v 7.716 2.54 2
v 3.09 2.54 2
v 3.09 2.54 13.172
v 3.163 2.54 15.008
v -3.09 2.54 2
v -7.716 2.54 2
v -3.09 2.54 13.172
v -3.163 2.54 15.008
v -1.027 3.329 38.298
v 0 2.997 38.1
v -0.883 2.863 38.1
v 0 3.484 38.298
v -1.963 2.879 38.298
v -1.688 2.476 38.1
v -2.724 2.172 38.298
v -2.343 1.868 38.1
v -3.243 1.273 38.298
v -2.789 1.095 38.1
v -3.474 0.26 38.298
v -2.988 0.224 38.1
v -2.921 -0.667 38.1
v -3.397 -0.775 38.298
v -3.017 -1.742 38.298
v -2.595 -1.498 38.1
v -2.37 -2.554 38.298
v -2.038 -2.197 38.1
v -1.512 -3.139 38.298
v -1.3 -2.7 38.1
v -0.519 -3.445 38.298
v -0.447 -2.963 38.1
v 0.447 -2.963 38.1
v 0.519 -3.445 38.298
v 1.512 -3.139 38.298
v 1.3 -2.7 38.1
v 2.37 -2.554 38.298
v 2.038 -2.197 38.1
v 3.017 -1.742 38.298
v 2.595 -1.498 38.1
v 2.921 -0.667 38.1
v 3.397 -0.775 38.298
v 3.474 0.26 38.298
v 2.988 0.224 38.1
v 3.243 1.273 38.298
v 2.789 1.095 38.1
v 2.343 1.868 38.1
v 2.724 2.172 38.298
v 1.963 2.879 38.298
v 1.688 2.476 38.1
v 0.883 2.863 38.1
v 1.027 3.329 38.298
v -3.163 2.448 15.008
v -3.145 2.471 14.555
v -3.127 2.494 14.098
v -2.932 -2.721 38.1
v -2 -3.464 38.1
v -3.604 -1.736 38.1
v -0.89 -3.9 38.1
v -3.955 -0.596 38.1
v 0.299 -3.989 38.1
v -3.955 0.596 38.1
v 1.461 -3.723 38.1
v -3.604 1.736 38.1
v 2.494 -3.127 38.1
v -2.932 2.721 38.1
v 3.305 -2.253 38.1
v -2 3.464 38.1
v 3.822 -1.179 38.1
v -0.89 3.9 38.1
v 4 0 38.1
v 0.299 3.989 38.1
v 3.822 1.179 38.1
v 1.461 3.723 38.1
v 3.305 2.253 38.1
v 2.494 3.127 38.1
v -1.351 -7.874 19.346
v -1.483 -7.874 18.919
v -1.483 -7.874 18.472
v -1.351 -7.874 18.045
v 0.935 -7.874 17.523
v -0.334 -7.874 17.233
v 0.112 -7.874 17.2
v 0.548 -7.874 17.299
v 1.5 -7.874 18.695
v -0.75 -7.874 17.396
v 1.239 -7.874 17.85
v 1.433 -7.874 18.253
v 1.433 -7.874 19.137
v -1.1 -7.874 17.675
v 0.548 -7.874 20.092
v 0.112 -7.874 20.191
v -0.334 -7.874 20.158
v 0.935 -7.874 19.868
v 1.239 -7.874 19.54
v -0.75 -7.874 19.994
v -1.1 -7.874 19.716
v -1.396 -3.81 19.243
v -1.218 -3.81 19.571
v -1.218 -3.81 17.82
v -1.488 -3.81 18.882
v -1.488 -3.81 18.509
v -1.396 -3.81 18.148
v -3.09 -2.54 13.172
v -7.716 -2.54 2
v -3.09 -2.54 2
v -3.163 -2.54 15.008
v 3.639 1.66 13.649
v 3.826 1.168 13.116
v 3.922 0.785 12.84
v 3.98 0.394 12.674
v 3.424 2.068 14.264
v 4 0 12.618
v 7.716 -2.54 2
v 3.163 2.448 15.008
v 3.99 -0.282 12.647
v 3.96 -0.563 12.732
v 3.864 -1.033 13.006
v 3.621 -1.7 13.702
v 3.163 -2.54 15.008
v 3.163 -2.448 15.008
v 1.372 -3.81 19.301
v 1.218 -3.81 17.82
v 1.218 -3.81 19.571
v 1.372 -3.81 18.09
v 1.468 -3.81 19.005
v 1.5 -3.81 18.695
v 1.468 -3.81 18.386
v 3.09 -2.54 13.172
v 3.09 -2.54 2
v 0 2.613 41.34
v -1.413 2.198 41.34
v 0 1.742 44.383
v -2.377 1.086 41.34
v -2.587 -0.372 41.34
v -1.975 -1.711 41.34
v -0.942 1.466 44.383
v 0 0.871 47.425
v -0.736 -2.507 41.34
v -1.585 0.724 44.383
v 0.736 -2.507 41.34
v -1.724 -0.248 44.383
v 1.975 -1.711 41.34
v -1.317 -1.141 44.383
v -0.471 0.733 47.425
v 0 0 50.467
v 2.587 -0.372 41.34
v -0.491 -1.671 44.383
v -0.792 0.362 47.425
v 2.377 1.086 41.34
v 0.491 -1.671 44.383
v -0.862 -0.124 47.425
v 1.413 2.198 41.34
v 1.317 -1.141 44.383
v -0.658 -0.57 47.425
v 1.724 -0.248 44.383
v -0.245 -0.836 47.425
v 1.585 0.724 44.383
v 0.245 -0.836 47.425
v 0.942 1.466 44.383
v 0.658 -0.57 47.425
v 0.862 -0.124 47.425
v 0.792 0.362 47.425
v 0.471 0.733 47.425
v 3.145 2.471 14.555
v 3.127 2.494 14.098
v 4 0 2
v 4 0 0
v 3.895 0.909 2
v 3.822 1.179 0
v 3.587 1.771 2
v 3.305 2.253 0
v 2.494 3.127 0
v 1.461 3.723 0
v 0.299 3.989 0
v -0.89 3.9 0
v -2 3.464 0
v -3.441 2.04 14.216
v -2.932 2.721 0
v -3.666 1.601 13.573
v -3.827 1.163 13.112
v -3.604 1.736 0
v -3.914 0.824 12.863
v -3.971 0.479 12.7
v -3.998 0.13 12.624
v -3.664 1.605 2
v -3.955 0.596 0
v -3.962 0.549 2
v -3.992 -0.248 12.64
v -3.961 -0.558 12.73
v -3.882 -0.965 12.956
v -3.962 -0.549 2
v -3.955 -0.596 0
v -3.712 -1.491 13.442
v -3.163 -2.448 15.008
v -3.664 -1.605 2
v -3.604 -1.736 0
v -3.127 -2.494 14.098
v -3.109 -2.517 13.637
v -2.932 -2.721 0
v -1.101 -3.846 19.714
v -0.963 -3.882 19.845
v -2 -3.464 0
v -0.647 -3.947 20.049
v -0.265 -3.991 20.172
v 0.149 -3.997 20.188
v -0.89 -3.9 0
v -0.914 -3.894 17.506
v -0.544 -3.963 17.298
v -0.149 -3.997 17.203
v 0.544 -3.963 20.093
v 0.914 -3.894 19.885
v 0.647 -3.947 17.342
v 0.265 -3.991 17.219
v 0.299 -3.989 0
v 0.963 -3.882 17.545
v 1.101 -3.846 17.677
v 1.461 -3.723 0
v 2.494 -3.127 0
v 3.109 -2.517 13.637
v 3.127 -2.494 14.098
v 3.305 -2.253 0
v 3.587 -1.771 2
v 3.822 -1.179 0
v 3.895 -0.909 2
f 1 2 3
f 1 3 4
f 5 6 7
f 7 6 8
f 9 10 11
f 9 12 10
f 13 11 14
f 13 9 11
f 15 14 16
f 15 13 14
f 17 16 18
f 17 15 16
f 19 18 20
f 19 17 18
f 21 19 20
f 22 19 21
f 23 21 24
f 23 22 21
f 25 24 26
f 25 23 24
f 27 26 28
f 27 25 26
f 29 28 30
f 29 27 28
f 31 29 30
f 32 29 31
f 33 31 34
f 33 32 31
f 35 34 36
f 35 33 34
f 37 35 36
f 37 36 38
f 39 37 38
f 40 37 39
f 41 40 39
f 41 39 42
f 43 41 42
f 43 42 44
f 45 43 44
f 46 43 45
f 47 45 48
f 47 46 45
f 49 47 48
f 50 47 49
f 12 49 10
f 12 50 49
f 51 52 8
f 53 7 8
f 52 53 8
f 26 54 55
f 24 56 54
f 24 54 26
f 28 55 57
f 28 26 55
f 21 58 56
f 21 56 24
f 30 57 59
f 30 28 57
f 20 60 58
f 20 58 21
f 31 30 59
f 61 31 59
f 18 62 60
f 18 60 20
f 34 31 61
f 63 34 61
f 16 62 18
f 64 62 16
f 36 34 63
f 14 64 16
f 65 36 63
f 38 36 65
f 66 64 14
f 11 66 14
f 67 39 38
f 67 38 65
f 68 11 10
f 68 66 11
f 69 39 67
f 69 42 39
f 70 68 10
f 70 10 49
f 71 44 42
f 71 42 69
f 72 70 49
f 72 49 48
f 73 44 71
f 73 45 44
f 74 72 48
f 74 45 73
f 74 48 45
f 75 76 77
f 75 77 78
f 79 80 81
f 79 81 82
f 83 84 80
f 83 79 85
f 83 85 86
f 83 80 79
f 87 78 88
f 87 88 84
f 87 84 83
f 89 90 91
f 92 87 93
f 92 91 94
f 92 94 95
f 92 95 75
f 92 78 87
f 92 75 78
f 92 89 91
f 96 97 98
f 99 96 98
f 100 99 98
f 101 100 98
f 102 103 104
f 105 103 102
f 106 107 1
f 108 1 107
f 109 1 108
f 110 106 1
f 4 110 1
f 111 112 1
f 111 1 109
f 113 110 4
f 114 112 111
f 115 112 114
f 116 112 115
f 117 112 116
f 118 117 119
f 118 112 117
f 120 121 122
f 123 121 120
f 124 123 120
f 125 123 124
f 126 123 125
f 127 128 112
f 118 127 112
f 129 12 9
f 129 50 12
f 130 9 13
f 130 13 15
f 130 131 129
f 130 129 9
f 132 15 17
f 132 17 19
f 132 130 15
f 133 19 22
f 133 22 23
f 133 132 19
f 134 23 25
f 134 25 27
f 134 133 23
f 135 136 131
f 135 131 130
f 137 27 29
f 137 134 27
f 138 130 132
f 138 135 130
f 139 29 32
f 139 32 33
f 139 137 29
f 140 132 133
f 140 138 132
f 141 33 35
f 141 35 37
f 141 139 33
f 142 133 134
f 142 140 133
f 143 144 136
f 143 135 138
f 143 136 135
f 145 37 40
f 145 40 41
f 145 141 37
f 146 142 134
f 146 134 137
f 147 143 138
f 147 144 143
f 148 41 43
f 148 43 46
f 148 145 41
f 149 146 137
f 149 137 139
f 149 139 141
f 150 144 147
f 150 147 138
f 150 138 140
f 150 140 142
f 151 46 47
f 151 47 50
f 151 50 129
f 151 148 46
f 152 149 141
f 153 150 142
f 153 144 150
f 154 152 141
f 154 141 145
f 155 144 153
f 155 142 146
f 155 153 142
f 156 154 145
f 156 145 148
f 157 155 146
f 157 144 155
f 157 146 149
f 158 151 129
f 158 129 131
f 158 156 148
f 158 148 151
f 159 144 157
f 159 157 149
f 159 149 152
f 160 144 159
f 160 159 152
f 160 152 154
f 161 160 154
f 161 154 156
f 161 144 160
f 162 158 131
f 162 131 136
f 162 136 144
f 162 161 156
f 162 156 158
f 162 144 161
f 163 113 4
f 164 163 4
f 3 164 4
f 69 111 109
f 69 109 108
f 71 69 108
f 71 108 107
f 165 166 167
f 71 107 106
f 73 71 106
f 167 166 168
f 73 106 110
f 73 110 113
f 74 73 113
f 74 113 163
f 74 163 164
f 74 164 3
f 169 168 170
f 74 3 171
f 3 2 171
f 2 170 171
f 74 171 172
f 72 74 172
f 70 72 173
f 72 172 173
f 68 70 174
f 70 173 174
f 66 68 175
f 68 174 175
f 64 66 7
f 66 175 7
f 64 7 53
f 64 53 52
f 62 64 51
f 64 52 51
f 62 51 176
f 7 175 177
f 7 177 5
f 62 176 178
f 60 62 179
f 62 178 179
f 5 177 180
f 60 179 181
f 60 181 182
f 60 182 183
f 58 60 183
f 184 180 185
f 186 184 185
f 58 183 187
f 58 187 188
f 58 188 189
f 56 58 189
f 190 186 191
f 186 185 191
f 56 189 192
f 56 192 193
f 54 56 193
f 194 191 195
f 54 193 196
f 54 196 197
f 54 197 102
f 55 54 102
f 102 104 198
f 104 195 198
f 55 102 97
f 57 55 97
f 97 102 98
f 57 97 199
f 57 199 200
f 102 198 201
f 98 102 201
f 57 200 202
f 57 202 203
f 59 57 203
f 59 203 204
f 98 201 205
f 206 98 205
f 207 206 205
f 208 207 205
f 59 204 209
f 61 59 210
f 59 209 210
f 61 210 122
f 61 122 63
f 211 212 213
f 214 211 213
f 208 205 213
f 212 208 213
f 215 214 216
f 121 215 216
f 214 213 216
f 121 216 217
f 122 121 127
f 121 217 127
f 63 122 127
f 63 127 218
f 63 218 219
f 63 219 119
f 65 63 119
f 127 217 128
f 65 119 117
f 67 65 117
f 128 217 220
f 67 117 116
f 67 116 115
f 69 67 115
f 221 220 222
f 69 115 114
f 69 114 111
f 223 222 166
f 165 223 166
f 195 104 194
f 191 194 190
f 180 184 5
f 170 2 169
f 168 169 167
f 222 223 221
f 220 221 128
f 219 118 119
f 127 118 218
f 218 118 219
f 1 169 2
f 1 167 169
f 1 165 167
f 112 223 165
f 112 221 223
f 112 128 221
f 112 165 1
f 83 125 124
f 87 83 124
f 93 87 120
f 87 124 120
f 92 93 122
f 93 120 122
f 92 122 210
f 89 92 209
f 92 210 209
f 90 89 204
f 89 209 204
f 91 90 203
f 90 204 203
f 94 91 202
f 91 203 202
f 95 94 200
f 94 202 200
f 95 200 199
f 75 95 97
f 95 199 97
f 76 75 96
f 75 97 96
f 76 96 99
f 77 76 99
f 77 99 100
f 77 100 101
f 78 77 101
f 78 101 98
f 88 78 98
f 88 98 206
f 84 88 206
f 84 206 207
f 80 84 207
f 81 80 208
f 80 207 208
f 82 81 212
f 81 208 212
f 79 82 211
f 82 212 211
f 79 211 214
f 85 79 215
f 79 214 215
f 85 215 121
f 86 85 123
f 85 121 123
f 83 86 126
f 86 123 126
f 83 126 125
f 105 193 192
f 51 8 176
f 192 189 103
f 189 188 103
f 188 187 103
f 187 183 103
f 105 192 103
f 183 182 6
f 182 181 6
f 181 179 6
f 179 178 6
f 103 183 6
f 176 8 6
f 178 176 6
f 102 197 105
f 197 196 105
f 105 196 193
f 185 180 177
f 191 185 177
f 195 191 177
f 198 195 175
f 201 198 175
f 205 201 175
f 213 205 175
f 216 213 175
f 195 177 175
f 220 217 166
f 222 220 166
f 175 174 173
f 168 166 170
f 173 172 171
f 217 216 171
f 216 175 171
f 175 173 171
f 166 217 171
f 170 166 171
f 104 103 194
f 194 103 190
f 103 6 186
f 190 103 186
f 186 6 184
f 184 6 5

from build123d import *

# Parameters (mm, degrees)
F0_R     = 4
F1_DEPTH = 38.1
F5_DEPTH = 2.54
F7_R     = 1.5
F8_DEPTH = 4.064


with BuildPart() as f1:
    # F0 (on Top) → F1 (new body)
    with BuildSketch(Plane.XY):
        Circle(F0_R)
    extrude(amount=F1_DEPTH)

    # F2 (on Right) → F3 (revolve)
    with BuildSketch(Plane.YZ):
        Polygon((0, 50.466843), (0, 36.88176), (3.484131, 38.298216), align=None)
    revolve(axis=Axis((0, 0, 43.674301), (0, 0, 1)))

    # F4 (on Front) → F5 (join, symmetric)
    with BuildSketch(Plane.XZ):
        Polygon((-7.716181, 2.000377), (-2.643188, 2.000377), (-3.163495, 15.008056), align=None)
        Polygon((7.716181, 2.000377), (3.163495, 15.008056), (2.643188, 2.000377), align=None)
    extrude(amount=F5_DEPTH, both=True)

    # F7 (on offset) → F8 (join)
    with BuildSketch(Plane.XZ.offset(3.81)):
        with Locations((0, 18.695335)):
            Circle(F7_R)
    extrude(amount=F8_DEPTH)


solid = f1.part
